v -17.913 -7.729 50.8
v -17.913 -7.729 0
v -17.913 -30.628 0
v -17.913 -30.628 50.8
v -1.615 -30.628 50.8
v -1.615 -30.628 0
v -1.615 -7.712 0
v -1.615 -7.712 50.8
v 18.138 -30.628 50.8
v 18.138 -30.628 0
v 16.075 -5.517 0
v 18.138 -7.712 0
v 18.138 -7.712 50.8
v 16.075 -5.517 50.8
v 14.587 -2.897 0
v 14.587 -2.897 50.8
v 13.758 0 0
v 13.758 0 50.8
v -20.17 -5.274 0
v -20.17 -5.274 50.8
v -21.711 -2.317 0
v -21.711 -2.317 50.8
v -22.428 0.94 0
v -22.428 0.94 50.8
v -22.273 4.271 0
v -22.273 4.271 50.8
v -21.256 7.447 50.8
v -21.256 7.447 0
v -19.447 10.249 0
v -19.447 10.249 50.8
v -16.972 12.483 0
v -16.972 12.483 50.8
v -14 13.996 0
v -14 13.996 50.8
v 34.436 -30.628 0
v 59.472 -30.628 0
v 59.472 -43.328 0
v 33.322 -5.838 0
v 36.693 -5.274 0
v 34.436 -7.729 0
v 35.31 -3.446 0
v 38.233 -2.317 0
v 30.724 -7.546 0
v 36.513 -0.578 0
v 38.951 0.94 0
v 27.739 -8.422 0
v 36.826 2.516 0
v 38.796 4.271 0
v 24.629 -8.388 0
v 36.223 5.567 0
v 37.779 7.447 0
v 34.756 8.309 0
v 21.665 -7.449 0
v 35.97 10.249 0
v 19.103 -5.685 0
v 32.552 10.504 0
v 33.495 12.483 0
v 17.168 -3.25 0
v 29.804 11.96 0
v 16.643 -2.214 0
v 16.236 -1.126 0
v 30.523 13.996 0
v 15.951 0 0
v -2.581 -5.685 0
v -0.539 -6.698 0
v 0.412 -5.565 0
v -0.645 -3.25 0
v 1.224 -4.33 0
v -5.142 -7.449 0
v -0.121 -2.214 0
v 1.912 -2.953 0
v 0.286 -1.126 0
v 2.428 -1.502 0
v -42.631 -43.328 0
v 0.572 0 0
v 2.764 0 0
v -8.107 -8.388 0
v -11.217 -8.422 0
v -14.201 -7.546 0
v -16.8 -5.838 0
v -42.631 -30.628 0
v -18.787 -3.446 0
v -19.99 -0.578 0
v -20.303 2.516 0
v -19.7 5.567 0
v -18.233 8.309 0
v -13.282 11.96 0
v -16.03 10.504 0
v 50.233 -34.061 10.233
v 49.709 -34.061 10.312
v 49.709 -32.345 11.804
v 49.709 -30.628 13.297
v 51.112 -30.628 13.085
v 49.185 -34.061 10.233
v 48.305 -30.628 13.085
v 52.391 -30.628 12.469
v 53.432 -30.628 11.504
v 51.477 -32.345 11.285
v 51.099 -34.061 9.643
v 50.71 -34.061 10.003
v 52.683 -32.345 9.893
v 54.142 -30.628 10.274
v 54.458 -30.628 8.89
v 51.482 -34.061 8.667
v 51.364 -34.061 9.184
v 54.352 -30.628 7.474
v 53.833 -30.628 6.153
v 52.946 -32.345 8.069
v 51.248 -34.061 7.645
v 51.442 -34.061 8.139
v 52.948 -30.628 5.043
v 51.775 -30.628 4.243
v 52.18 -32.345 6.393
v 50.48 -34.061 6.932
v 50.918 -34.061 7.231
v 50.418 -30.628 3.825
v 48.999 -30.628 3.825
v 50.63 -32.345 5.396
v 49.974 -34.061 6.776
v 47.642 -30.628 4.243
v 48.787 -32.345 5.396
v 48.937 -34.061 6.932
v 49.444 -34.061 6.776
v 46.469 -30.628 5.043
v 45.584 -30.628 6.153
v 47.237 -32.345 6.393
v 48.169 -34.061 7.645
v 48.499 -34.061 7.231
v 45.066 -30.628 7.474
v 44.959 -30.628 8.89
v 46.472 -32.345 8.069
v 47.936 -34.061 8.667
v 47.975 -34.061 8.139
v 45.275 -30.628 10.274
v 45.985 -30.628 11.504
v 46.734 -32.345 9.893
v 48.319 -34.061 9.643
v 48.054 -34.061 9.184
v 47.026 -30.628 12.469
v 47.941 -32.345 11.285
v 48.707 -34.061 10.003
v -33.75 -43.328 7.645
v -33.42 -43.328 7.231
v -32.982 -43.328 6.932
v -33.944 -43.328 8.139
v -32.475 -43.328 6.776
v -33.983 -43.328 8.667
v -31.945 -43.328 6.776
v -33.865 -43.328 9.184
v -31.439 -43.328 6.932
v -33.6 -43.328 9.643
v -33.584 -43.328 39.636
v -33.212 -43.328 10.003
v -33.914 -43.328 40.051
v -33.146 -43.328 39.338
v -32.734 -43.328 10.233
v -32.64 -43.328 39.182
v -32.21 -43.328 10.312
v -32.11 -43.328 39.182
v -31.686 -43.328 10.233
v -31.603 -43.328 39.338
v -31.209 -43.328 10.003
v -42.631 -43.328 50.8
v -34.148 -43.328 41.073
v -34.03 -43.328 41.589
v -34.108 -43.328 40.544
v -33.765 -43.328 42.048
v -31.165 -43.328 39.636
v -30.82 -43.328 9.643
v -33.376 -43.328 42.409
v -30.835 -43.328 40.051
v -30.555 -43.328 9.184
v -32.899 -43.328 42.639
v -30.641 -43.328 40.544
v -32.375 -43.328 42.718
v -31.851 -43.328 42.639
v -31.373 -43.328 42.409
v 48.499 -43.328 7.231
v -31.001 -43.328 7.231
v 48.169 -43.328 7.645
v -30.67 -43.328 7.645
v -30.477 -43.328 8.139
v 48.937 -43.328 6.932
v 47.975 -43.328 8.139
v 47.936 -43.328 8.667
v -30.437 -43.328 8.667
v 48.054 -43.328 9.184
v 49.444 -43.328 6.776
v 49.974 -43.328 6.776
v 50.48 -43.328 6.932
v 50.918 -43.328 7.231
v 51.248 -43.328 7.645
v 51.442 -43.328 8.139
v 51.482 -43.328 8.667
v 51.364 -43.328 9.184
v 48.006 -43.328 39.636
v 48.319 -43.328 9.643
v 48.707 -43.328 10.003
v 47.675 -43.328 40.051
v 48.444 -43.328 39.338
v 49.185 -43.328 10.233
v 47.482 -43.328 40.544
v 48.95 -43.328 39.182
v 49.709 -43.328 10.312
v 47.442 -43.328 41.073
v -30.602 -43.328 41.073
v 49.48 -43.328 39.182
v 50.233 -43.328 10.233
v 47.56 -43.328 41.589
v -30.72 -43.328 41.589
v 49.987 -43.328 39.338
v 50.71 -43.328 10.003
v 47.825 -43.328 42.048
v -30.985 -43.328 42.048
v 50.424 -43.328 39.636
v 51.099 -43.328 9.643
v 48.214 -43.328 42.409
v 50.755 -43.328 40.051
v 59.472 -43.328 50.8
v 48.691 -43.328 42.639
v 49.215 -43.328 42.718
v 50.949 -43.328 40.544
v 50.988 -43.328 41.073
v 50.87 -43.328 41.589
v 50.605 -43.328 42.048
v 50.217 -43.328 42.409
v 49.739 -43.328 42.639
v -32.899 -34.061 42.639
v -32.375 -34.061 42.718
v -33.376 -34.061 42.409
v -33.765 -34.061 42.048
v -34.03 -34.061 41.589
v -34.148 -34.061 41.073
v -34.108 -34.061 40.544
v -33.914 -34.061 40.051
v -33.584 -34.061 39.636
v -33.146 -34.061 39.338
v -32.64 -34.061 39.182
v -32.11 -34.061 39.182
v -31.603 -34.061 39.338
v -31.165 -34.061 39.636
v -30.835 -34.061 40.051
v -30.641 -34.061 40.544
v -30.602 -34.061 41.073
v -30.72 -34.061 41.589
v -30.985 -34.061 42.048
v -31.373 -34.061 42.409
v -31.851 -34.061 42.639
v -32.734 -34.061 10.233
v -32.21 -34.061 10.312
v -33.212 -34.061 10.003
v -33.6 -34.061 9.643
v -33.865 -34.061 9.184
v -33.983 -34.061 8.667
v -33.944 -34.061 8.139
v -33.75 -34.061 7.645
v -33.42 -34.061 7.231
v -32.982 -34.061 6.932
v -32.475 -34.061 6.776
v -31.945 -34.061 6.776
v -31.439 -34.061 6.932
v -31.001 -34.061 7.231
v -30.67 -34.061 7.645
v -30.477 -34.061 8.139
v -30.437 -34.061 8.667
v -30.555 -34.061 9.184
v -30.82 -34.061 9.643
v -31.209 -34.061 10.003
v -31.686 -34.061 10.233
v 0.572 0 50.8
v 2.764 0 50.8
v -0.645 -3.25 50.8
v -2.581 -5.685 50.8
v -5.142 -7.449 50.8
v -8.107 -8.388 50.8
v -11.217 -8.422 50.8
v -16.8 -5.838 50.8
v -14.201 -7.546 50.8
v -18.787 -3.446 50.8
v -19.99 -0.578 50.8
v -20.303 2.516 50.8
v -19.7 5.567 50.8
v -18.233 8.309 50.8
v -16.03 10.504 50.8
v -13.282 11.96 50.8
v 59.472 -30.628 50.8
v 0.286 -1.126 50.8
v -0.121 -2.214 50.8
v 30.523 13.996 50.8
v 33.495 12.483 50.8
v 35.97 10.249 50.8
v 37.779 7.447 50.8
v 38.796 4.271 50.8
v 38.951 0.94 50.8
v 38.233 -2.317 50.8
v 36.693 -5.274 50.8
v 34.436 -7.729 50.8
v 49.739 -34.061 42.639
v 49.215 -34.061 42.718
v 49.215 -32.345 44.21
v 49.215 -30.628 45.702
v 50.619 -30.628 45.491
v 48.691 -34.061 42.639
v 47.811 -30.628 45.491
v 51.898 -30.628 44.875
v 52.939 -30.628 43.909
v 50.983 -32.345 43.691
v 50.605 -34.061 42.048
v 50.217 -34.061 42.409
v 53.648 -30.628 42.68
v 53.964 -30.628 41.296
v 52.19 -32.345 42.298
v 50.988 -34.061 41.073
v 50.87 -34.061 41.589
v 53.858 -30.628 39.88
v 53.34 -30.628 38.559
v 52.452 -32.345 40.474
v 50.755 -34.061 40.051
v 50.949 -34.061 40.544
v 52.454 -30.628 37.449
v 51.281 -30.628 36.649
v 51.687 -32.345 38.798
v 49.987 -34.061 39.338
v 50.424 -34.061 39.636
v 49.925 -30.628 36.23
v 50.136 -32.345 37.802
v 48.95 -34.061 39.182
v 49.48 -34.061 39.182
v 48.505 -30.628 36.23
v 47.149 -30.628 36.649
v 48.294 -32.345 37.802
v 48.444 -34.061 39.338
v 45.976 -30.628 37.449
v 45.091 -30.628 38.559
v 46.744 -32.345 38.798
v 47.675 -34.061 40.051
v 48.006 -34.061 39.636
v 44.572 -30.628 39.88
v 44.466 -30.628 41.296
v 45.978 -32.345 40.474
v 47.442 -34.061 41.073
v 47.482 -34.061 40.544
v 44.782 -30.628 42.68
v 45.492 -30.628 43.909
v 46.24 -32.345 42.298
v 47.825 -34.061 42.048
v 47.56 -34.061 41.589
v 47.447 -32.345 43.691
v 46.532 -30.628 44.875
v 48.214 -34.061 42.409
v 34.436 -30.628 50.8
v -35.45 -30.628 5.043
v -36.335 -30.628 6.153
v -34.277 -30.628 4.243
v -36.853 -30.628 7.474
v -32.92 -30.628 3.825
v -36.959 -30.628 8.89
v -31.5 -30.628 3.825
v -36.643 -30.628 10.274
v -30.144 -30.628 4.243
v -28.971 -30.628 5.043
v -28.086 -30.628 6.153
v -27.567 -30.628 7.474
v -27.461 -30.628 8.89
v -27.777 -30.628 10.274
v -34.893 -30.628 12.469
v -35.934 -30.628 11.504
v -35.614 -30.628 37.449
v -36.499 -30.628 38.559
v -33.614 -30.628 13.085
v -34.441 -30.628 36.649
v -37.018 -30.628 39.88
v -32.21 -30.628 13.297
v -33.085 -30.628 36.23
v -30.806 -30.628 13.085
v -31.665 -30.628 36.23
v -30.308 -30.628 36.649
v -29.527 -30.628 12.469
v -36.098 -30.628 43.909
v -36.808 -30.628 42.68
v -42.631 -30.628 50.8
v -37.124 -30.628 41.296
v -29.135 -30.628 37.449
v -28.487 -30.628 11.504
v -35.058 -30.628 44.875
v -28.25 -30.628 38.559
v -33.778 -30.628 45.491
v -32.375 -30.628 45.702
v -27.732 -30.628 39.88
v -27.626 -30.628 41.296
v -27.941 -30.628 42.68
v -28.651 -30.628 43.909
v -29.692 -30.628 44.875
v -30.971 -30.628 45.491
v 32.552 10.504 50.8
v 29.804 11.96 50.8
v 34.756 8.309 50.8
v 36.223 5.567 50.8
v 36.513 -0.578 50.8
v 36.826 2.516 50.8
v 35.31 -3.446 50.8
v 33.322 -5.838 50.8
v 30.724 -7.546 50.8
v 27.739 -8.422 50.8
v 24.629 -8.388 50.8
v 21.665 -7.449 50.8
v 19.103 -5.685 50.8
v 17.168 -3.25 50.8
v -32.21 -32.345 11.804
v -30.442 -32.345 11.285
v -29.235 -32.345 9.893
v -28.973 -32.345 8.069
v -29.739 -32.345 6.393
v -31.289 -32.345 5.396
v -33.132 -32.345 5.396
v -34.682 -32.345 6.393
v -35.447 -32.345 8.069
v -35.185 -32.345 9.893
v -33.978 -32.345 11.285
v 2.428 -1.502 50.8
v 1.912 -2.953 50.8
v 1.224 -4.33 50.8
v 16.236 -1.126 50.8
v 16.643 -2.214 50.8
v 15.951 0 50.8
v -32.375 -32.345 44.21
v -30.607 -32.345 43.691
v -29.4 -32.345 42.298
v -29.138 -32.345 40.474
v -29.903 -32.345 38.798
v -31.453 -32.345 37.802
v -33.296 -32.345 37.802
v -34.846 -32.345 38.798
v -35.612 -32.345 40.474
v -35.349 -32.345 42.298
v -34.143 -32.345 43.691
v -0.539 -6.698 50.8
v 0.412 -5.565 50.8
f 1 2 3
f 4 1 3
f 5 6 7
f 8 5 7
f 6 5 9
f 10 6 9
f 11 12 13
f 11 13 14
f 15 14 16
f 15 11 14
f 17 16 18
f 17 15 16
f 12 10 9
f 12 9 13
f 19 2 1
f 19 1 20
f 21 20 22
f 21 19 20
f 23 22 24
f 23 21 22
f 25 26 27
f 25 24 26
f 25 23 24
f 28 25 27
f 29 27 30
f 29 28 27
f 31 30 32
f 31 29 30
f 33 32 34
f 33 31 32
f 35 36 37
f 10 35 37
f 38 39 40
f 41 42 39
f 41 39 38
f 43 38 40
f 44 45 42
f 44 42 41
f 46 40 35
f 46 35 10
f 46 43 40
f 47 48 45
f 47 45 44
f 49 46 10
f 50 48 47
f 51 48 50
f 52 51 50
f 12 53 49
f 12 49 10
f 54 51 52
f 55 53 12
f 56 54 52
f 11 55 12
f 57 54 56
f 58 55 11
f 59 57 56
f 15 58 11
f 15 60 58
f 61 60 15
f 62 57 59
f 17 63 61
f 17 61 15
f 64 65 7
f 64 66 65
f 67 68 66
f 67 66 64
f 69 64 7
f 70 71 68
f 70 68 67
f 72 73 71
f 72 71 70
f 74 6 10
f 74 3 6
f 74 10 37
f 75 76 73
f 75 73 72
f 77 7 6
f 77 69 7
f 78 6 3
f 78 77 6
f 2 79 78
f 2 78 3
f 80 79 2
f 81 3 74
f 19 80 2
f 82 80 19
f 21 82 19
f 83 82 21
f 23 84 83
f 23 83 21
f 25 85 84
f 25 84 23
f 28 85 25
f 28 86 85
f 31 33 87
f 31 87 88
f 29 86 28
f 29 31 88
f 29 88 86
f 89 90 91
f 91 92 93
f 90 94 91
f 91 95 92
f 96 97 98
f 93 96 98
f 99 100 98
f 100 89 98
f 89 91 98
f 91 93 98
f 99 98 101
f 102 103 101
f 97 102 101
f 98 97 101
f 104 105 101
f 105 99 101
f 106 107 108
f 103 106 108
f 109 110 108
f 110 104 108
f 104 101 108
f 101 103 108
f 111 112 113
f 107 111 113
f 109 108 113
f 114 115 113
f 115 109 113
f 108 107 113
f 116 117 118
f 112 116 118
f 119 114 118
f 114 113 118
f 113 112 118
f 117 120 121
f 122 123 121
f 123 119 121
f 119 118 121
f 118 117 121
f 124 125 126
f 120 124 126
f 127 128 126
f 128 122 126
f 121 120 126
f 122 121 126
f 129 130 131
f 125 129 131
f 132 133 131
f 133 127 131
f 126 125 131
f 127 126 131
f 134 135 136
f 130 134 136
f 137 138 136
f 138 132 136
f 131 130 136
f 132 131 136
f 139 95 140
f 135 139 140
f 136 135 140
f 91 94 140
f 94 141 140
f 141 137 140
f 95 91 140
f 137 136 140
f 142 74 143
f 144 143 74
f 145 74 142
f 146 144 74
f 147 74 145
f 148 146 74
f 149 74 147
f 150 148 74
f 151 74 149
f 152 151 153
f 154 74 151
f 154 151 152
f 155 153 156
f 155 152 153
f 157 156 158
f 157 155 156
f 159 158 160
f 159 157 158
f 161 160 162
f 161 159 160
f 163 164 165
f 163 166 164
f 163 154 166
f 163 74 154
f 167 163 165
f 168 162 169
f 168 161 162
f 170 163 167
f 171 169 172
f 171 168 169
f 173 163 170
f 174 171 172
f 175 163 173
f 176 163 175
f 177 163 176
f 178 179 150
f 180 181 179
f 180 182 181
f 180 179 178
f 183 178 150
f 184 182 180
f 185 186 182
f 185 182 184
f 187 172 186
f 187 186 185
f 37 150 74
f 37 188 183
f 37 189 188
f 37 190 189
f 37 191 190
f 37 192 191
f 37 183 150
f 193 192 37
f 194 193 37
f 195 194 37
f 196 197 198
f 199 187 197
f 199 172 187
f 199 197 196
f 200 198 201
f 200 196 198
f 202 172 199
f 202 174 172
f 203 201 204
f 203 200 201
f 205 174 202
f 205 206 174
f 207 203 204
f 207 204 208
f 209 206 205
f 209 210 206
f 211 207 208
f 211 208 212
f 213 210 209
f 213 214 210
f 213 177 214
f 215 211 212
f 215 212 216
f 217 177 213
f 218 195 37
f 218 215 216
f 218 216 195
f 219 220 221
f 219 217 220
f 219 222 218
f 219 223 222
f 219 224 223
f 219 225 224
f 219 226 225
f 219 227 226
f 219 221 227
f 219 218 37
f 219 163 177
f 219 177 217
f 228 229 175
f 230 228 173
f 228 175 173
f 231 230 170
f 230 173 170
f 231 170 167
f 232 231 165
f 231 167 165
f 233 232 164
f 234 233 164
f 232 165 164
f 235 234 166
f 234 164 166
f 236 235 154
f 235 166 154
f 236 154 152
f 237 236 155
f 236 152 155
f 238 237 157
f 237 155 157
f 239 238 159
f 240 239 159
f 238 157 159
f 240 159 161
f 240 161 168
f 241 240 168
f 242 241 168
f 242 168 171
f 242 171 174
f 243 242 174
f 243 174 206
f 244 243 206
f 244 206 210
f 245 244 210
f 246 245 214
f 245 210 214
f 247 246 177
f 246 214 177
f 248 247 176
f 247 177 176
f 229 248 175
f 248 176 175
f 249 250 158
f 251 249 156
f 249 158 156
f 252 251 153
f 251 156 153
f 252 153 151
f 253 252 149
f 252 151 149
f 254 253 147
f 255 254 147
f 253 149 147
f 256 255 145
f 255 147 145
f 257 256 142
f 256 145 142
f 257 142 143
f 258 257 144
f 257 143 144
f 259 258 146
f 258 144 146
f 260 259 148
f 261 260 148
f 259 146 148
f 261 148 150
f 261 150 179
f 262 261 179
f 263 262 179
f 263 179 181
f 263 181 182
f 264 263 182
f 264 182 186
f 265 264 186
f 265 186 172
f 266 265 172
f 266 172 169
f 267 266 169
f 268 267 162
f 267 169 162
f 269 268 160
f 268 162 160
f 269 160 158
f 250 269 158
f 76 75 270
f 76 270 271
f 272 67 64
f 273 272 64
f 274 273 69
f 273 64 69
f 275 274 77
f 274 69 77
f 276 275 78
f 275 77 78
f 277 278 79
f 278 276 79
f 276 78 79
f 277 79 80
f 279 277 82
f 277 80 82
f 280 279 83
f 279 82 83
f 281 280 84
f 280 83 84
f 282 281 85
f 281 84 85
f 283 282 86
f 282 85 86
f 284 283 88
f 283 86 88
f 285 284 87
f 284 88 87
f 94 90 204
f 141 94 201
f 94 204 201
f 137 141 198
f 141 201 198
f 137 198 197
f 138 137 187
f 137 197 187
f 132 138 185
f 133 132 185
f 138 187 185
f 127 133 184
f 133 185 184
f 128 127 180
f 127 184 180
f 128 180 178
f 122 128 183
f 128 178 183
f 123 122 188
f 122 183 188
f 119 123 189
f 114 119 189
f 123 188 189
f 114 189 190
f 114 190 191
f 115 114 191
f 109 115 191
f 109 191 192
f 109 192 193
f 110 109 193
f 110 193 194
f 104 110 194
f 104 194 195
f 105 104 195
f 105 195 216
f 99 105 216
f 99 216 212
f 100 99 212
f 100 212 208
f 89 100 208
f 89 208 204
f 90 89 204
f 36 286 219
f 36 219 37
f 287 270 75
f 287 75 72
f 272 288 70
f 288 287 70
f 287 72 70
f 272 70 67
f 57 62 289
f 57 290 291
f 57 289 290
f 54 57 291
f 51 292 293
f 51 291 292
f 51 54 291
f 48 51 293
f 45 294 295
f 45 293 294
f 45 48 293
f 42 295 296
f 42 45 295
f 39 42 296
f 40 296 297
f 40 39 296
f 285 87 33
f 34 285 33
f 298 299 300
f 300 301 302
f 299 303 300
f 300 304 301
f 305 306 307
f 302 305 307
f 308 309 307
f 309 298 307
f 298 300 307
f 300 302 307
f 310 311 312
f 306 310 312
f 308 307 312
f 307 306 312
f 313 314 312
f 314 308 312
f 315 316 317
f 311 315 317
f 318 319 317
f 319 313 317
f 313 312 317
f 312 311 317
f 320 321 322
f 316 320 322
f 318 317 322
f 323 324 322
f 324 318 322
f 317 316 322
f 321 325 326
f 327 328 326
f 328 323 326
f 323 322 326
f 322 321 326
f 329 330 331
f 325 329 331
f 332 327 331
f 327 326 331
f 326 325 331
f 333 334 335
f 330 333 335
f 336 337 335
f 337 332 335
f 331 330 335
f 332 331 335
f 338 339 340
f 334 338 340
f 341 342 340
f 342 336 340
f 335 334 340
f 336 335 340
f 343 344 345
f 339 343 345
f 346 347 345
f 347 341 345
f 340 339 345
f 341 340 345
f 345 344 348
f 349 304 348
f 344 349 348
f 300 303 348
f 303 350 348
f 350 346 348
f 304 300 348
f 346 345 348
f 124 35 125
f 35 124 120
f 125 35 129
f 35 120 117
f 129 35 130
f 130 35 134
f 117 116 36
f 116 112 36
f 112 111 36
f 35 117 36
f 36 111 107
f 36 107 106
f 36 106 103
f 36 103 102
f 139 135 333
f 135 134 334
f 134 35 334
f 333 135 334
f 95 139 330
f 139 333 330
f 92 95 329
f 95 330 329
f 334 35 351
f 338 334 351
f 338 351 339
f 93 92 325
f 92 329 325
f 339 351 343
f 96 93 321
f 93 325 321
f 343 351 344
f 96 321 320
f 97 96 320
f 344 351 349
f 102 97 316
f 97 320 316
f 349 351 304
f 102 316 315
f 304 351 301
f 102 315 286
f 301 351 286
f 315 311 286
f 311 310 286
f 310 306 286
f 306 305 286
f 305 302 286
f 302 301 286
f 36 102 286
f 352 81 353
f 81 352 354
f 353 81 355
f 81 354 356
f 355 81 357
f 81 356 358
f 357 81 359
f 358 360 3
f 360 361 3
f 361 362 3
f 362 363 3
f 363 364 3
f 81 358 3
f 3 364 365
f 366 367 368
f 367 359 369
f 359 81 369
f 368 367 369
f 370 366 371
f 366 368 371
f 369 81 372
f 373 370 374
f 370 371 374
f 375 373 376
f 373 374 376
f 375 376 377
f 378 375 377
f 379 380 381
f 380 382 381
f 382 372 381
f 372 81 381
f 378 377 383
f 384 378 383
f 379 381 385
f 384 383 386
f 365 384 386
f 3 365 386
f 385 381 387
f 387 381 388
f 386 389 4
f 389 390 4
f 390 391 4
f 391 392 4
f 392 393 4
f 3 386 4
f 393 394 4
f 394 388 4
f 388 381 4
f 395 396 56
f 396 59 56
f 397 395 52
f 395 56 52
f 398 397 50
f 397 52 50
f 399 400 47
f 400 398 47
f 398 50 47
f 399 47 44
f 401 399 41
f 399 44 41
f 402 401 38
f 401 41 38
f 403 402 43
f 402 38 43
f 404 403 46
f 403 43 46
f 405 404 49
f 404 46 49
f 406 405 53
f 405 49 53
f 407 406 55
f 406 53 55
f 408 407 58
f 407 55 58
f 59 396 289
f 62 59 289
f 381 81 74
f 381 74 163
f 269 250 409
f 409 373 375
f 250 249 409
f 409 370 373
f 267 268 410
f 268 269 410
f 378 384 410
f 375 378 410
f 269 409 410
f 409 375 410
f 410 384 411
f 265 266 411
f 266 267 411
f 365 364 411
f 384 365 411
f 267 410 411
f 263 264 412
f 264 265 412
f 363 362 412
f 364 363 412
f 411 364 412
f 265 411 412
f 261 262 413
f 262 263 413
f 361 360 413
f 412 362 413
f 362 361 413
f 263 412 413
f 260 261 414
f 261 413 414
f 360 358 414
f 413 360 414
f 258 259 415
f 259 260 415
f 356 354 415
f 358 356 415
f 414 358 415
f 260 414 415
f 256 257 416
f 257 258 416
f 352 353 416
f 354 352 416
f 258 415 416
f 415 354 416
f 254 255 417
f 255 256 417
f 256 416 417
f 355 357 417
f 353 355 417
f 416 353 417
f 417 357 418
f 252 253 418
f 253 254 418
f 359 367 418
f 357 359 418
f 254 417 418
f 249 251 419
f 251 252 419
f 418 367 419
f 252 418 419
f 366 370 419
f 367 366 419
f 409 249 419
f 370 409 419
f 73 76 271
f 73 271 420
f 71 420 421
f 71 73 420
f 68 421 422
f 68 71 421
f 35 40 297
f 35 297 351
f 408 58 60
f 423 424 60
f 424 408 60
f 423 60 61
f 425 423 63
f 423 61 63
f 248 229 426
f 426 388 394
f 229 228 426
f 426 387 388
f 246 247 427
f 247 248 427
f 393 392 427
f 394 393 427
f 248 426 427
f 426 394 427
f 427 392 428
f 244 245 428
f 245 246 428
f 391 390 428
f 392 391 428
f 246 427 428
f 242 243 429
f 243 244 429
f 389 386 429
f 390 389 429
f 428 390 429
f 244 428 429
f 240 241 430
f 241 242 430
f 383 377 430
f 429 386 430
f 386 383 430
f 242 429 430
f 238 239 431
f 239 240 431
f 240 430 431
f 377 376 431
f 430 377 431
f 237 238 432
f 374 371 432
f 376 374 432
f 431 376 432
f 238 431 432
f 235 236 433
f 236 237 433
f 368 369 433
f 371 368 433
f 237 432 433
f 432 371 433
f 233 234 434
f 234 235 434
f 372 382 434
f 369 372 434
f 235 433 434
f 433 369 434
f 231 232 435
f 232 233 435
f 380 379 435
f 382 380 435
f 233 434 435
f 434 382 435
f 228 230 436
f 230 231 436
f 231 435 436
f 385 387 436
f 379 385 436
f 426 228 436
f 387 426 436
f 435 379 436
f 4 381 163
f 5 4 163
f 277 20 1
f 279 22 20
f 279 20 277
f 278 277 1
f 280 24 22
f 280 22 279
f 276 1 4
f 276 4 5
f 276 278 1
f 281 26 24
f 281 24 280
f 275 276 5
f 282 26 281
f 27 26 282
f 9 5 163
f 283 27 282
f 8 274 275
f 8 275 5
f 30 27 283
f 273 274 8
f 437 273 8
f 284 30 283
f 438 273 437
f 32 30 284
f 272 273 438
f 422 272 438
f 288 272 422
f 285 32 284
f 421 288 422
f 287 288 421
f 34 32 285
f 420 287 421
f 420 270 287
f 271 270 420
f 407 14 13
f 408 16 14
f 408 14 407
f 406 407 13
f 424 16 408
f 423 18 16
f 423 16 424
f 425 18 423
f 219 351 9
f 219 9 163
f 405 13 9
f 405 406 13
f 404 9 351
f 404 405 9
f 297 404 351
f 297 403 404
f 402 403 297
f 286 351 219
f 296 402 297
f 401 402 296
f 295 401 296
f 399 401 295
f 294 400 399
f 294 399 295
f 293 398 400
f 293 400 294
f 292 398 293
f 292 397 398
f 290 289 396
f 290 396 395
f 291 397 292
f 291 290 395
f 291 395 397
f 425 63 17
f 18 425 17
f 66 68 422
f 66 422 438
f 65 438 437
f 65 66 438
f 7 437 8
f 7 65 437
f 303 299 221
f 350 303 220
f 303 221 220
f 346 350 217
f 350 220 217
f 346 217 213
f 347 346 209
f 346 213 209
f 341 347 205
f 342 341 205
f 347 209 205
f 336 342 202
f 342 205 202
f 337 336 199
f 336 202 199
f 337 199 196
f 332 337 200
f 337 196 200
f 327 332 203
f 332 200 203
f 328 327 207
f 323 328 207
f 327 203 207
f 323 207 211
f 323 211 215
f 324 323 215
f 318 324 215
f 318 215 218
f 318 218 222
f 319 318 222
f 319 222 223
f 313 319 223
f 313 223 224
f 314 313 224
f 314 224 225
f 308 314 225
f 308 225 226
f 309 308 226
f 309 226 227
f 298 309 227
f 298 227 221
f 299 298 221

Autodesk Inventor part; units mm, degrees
ref_plane "YZ Plane" through (0, 0, 0) normal (1, 0, 0) x (0, 1, 0)
ref_plane "XZ Plane" through (0, 0, 0) normal (0, 1, 0) x (-1, 0, 0)
ref_plane "XY Plane" through (0, 0, 0) normal (0, 0, 1) x (1, 0, 0)
sketch "Sketch1" plane through (0, 0, 0) normal (0, 0, 1) x (1, 0, 0)
  arc A0 (-13.2818, 11.9603) -> (-0.6453, -3.2505) centre (-9.7741, 2.02) ccw
  line L0 (-9.7741, 2.02) -> (-0.6453, 7.2905) construction
  line L1 (-9.7741, 2.02) -> (0.7669, 2.02) construction
  line L2 (-9.7741, 2.02) -> (-0.6453, -3.2505) construction
  line L3 (-9.7741, 2.02) -> (0.7669, 2.02) construction
  line L4 (8.2613, 16.5876) -> (8.2613, -12.065) construction
  line L5 (-13.2818, 11.9603) -> (-14.0002, 13.9962)
  arc A1 (-13.2818, 11.9603) -> (0.5715, 0) centre (-9.7741, 2.02) ccw
  line L6 (0.5715, 0) -> (2.7642, 0)
  arc A2 (17.168, -3.2505) -> (29.8044, 11.9603) centre (26.2967, 2.02) ccw
  line L7 (29.8044, 11.9603) -> (30.5229, 13.9962)
  arc A3 (15.9511, 0) -> (29.8044, 11.9603) centre (26.2967, 2.02) ccw
  line L8 (15.9511, 0) -> (13.7584, 0)
  line L9 (-17.9133, -7.729) -> (-17.9133, -30.6279)
  line L10 (-17.9133, -30.6279) -> (-1.615, -30.6279)
  line L11 (-1.615, -30.6279) -> (-1.615, -7.7124)
  line L12 (34.436, -7.729) -> (34.436, -30.6279)
  line L13 (34.436, -30.6279) -> (18.1376, -30.6279)
  line L14 (18.1376, -30.6279) -> (18.1376, -7.7124)
  arc A4 (13.7584, 0) -> (18.1376, -7.7124) centre (26.2967, 2.02) ccw
  arc A5 (34.436, -7.729) -> (30.5229, 13.9962) centre (26.2967, 2.02) ccw
  arc A6 (15.2982, -4.33) -> (18.1376, -7.7124) centre (26.2967, 2.02) ccw
  arc A7 (34.436, -7.729) -> (30.5229, 13.9962) centre (26.2967, 2.02) ccw
  arc A8 (-14.0002, 13.9962) -> (-17.9133, -7.729) centre (-9.7741, 2.02) ccw
  arc A9 (-1.615, -7.7124) -> (1.2244, -4.33) centre (-9.7741, 2.02) ccw
  arc A10 (-14.0002, 13.9962) -> (-17.9133, -7.729) centre (-9.7741, 2.02) ccw
  arc A11 (-1.615, -7.7124) -> (2.7642, 0) centre (-9.7741, 2.02) ccw
  point P0 (0, 0)
  dimension "d0" = 21.082
  dimension "d2" = 30
  dimension "d3" = 30
extrude "Extrusion1" add sketch "Sketch1" along normal blind 50.8
sketch "Sketch2" plane through (-17.9133, -30.6279, 0) normal (0, -1, 0) x (1, 0, 0)
  line L0 (-24.7177, 50.8) -> (77.3849, 50.8)
  line L1 (77.3849, 50.8) -> (77.3849, 0)
  line L2 (77.3849, 0) -> (-24.7177, 0)
  line L3 (-24.7177, 0) -> (-24.7177, 50.8)
  point P0 (17.9133, 0)
extrude "Extrusion2" add sketch "Sketch2" along normal blind 12.7
sketch "Sketch3" plane through (-17.9133, -30.6279, 0) normal (0, 1, 0) x (1, 0, 0)
  point P0 (17.9133, 0)
sketch "Sketch4" plane through (-17.9133, -30.6279, 0) normal (0, 1, 0) x (1, 0, 0)
  point P0 (17.9133, 0)
hole "Hole1" at (49.2151, -30.6279, 40.9398) direction (0, -1, 0) diameter 3.556 end through all countersink diameter 9.525 countersink angle 82
hole "Hole2" at (49.7086, -30.6279, 8.5342) direction (0, -1, 0) diameter 3.556 end through all countersink diameter 9.525 countersink angle 82
hole "Hole3" at (-32.3747, -30.6279, 40.9398) direction (0, -1, 0) diameter 3.556 end through all countersink diameter 9.525 countersink angle 82
hole "Hole4" at (-32.2102, -30.6279, 8.5342) direction (0, -1, 0) diameter 3.556 end through all countersink diameter 9.525 countersink angle 82
thread "Thread1" size "6-32 UNC" class "2B" standard "ANSI Unified Screw Threads" full length
thread "Thread2" size "6-32 UNC" class "2B" standard "ANSI Unified Screw Threads" full length
thread "Thread3" size "8-32 UNC" class "2B" standard "ANSI Unified Screw Threads" full length
thread "Thread4" size "6-32 UNC" class "2B" standard "ANSI Unified Screw Threads" full length
thread "Thread5" size "6-32 UNC" class "2B" standard "ANSI Unified Screw Threads" full length
thread "Thread6" size "6-32 UNC" class "2B" standard "ANSI Unified Screw Threads" full length
